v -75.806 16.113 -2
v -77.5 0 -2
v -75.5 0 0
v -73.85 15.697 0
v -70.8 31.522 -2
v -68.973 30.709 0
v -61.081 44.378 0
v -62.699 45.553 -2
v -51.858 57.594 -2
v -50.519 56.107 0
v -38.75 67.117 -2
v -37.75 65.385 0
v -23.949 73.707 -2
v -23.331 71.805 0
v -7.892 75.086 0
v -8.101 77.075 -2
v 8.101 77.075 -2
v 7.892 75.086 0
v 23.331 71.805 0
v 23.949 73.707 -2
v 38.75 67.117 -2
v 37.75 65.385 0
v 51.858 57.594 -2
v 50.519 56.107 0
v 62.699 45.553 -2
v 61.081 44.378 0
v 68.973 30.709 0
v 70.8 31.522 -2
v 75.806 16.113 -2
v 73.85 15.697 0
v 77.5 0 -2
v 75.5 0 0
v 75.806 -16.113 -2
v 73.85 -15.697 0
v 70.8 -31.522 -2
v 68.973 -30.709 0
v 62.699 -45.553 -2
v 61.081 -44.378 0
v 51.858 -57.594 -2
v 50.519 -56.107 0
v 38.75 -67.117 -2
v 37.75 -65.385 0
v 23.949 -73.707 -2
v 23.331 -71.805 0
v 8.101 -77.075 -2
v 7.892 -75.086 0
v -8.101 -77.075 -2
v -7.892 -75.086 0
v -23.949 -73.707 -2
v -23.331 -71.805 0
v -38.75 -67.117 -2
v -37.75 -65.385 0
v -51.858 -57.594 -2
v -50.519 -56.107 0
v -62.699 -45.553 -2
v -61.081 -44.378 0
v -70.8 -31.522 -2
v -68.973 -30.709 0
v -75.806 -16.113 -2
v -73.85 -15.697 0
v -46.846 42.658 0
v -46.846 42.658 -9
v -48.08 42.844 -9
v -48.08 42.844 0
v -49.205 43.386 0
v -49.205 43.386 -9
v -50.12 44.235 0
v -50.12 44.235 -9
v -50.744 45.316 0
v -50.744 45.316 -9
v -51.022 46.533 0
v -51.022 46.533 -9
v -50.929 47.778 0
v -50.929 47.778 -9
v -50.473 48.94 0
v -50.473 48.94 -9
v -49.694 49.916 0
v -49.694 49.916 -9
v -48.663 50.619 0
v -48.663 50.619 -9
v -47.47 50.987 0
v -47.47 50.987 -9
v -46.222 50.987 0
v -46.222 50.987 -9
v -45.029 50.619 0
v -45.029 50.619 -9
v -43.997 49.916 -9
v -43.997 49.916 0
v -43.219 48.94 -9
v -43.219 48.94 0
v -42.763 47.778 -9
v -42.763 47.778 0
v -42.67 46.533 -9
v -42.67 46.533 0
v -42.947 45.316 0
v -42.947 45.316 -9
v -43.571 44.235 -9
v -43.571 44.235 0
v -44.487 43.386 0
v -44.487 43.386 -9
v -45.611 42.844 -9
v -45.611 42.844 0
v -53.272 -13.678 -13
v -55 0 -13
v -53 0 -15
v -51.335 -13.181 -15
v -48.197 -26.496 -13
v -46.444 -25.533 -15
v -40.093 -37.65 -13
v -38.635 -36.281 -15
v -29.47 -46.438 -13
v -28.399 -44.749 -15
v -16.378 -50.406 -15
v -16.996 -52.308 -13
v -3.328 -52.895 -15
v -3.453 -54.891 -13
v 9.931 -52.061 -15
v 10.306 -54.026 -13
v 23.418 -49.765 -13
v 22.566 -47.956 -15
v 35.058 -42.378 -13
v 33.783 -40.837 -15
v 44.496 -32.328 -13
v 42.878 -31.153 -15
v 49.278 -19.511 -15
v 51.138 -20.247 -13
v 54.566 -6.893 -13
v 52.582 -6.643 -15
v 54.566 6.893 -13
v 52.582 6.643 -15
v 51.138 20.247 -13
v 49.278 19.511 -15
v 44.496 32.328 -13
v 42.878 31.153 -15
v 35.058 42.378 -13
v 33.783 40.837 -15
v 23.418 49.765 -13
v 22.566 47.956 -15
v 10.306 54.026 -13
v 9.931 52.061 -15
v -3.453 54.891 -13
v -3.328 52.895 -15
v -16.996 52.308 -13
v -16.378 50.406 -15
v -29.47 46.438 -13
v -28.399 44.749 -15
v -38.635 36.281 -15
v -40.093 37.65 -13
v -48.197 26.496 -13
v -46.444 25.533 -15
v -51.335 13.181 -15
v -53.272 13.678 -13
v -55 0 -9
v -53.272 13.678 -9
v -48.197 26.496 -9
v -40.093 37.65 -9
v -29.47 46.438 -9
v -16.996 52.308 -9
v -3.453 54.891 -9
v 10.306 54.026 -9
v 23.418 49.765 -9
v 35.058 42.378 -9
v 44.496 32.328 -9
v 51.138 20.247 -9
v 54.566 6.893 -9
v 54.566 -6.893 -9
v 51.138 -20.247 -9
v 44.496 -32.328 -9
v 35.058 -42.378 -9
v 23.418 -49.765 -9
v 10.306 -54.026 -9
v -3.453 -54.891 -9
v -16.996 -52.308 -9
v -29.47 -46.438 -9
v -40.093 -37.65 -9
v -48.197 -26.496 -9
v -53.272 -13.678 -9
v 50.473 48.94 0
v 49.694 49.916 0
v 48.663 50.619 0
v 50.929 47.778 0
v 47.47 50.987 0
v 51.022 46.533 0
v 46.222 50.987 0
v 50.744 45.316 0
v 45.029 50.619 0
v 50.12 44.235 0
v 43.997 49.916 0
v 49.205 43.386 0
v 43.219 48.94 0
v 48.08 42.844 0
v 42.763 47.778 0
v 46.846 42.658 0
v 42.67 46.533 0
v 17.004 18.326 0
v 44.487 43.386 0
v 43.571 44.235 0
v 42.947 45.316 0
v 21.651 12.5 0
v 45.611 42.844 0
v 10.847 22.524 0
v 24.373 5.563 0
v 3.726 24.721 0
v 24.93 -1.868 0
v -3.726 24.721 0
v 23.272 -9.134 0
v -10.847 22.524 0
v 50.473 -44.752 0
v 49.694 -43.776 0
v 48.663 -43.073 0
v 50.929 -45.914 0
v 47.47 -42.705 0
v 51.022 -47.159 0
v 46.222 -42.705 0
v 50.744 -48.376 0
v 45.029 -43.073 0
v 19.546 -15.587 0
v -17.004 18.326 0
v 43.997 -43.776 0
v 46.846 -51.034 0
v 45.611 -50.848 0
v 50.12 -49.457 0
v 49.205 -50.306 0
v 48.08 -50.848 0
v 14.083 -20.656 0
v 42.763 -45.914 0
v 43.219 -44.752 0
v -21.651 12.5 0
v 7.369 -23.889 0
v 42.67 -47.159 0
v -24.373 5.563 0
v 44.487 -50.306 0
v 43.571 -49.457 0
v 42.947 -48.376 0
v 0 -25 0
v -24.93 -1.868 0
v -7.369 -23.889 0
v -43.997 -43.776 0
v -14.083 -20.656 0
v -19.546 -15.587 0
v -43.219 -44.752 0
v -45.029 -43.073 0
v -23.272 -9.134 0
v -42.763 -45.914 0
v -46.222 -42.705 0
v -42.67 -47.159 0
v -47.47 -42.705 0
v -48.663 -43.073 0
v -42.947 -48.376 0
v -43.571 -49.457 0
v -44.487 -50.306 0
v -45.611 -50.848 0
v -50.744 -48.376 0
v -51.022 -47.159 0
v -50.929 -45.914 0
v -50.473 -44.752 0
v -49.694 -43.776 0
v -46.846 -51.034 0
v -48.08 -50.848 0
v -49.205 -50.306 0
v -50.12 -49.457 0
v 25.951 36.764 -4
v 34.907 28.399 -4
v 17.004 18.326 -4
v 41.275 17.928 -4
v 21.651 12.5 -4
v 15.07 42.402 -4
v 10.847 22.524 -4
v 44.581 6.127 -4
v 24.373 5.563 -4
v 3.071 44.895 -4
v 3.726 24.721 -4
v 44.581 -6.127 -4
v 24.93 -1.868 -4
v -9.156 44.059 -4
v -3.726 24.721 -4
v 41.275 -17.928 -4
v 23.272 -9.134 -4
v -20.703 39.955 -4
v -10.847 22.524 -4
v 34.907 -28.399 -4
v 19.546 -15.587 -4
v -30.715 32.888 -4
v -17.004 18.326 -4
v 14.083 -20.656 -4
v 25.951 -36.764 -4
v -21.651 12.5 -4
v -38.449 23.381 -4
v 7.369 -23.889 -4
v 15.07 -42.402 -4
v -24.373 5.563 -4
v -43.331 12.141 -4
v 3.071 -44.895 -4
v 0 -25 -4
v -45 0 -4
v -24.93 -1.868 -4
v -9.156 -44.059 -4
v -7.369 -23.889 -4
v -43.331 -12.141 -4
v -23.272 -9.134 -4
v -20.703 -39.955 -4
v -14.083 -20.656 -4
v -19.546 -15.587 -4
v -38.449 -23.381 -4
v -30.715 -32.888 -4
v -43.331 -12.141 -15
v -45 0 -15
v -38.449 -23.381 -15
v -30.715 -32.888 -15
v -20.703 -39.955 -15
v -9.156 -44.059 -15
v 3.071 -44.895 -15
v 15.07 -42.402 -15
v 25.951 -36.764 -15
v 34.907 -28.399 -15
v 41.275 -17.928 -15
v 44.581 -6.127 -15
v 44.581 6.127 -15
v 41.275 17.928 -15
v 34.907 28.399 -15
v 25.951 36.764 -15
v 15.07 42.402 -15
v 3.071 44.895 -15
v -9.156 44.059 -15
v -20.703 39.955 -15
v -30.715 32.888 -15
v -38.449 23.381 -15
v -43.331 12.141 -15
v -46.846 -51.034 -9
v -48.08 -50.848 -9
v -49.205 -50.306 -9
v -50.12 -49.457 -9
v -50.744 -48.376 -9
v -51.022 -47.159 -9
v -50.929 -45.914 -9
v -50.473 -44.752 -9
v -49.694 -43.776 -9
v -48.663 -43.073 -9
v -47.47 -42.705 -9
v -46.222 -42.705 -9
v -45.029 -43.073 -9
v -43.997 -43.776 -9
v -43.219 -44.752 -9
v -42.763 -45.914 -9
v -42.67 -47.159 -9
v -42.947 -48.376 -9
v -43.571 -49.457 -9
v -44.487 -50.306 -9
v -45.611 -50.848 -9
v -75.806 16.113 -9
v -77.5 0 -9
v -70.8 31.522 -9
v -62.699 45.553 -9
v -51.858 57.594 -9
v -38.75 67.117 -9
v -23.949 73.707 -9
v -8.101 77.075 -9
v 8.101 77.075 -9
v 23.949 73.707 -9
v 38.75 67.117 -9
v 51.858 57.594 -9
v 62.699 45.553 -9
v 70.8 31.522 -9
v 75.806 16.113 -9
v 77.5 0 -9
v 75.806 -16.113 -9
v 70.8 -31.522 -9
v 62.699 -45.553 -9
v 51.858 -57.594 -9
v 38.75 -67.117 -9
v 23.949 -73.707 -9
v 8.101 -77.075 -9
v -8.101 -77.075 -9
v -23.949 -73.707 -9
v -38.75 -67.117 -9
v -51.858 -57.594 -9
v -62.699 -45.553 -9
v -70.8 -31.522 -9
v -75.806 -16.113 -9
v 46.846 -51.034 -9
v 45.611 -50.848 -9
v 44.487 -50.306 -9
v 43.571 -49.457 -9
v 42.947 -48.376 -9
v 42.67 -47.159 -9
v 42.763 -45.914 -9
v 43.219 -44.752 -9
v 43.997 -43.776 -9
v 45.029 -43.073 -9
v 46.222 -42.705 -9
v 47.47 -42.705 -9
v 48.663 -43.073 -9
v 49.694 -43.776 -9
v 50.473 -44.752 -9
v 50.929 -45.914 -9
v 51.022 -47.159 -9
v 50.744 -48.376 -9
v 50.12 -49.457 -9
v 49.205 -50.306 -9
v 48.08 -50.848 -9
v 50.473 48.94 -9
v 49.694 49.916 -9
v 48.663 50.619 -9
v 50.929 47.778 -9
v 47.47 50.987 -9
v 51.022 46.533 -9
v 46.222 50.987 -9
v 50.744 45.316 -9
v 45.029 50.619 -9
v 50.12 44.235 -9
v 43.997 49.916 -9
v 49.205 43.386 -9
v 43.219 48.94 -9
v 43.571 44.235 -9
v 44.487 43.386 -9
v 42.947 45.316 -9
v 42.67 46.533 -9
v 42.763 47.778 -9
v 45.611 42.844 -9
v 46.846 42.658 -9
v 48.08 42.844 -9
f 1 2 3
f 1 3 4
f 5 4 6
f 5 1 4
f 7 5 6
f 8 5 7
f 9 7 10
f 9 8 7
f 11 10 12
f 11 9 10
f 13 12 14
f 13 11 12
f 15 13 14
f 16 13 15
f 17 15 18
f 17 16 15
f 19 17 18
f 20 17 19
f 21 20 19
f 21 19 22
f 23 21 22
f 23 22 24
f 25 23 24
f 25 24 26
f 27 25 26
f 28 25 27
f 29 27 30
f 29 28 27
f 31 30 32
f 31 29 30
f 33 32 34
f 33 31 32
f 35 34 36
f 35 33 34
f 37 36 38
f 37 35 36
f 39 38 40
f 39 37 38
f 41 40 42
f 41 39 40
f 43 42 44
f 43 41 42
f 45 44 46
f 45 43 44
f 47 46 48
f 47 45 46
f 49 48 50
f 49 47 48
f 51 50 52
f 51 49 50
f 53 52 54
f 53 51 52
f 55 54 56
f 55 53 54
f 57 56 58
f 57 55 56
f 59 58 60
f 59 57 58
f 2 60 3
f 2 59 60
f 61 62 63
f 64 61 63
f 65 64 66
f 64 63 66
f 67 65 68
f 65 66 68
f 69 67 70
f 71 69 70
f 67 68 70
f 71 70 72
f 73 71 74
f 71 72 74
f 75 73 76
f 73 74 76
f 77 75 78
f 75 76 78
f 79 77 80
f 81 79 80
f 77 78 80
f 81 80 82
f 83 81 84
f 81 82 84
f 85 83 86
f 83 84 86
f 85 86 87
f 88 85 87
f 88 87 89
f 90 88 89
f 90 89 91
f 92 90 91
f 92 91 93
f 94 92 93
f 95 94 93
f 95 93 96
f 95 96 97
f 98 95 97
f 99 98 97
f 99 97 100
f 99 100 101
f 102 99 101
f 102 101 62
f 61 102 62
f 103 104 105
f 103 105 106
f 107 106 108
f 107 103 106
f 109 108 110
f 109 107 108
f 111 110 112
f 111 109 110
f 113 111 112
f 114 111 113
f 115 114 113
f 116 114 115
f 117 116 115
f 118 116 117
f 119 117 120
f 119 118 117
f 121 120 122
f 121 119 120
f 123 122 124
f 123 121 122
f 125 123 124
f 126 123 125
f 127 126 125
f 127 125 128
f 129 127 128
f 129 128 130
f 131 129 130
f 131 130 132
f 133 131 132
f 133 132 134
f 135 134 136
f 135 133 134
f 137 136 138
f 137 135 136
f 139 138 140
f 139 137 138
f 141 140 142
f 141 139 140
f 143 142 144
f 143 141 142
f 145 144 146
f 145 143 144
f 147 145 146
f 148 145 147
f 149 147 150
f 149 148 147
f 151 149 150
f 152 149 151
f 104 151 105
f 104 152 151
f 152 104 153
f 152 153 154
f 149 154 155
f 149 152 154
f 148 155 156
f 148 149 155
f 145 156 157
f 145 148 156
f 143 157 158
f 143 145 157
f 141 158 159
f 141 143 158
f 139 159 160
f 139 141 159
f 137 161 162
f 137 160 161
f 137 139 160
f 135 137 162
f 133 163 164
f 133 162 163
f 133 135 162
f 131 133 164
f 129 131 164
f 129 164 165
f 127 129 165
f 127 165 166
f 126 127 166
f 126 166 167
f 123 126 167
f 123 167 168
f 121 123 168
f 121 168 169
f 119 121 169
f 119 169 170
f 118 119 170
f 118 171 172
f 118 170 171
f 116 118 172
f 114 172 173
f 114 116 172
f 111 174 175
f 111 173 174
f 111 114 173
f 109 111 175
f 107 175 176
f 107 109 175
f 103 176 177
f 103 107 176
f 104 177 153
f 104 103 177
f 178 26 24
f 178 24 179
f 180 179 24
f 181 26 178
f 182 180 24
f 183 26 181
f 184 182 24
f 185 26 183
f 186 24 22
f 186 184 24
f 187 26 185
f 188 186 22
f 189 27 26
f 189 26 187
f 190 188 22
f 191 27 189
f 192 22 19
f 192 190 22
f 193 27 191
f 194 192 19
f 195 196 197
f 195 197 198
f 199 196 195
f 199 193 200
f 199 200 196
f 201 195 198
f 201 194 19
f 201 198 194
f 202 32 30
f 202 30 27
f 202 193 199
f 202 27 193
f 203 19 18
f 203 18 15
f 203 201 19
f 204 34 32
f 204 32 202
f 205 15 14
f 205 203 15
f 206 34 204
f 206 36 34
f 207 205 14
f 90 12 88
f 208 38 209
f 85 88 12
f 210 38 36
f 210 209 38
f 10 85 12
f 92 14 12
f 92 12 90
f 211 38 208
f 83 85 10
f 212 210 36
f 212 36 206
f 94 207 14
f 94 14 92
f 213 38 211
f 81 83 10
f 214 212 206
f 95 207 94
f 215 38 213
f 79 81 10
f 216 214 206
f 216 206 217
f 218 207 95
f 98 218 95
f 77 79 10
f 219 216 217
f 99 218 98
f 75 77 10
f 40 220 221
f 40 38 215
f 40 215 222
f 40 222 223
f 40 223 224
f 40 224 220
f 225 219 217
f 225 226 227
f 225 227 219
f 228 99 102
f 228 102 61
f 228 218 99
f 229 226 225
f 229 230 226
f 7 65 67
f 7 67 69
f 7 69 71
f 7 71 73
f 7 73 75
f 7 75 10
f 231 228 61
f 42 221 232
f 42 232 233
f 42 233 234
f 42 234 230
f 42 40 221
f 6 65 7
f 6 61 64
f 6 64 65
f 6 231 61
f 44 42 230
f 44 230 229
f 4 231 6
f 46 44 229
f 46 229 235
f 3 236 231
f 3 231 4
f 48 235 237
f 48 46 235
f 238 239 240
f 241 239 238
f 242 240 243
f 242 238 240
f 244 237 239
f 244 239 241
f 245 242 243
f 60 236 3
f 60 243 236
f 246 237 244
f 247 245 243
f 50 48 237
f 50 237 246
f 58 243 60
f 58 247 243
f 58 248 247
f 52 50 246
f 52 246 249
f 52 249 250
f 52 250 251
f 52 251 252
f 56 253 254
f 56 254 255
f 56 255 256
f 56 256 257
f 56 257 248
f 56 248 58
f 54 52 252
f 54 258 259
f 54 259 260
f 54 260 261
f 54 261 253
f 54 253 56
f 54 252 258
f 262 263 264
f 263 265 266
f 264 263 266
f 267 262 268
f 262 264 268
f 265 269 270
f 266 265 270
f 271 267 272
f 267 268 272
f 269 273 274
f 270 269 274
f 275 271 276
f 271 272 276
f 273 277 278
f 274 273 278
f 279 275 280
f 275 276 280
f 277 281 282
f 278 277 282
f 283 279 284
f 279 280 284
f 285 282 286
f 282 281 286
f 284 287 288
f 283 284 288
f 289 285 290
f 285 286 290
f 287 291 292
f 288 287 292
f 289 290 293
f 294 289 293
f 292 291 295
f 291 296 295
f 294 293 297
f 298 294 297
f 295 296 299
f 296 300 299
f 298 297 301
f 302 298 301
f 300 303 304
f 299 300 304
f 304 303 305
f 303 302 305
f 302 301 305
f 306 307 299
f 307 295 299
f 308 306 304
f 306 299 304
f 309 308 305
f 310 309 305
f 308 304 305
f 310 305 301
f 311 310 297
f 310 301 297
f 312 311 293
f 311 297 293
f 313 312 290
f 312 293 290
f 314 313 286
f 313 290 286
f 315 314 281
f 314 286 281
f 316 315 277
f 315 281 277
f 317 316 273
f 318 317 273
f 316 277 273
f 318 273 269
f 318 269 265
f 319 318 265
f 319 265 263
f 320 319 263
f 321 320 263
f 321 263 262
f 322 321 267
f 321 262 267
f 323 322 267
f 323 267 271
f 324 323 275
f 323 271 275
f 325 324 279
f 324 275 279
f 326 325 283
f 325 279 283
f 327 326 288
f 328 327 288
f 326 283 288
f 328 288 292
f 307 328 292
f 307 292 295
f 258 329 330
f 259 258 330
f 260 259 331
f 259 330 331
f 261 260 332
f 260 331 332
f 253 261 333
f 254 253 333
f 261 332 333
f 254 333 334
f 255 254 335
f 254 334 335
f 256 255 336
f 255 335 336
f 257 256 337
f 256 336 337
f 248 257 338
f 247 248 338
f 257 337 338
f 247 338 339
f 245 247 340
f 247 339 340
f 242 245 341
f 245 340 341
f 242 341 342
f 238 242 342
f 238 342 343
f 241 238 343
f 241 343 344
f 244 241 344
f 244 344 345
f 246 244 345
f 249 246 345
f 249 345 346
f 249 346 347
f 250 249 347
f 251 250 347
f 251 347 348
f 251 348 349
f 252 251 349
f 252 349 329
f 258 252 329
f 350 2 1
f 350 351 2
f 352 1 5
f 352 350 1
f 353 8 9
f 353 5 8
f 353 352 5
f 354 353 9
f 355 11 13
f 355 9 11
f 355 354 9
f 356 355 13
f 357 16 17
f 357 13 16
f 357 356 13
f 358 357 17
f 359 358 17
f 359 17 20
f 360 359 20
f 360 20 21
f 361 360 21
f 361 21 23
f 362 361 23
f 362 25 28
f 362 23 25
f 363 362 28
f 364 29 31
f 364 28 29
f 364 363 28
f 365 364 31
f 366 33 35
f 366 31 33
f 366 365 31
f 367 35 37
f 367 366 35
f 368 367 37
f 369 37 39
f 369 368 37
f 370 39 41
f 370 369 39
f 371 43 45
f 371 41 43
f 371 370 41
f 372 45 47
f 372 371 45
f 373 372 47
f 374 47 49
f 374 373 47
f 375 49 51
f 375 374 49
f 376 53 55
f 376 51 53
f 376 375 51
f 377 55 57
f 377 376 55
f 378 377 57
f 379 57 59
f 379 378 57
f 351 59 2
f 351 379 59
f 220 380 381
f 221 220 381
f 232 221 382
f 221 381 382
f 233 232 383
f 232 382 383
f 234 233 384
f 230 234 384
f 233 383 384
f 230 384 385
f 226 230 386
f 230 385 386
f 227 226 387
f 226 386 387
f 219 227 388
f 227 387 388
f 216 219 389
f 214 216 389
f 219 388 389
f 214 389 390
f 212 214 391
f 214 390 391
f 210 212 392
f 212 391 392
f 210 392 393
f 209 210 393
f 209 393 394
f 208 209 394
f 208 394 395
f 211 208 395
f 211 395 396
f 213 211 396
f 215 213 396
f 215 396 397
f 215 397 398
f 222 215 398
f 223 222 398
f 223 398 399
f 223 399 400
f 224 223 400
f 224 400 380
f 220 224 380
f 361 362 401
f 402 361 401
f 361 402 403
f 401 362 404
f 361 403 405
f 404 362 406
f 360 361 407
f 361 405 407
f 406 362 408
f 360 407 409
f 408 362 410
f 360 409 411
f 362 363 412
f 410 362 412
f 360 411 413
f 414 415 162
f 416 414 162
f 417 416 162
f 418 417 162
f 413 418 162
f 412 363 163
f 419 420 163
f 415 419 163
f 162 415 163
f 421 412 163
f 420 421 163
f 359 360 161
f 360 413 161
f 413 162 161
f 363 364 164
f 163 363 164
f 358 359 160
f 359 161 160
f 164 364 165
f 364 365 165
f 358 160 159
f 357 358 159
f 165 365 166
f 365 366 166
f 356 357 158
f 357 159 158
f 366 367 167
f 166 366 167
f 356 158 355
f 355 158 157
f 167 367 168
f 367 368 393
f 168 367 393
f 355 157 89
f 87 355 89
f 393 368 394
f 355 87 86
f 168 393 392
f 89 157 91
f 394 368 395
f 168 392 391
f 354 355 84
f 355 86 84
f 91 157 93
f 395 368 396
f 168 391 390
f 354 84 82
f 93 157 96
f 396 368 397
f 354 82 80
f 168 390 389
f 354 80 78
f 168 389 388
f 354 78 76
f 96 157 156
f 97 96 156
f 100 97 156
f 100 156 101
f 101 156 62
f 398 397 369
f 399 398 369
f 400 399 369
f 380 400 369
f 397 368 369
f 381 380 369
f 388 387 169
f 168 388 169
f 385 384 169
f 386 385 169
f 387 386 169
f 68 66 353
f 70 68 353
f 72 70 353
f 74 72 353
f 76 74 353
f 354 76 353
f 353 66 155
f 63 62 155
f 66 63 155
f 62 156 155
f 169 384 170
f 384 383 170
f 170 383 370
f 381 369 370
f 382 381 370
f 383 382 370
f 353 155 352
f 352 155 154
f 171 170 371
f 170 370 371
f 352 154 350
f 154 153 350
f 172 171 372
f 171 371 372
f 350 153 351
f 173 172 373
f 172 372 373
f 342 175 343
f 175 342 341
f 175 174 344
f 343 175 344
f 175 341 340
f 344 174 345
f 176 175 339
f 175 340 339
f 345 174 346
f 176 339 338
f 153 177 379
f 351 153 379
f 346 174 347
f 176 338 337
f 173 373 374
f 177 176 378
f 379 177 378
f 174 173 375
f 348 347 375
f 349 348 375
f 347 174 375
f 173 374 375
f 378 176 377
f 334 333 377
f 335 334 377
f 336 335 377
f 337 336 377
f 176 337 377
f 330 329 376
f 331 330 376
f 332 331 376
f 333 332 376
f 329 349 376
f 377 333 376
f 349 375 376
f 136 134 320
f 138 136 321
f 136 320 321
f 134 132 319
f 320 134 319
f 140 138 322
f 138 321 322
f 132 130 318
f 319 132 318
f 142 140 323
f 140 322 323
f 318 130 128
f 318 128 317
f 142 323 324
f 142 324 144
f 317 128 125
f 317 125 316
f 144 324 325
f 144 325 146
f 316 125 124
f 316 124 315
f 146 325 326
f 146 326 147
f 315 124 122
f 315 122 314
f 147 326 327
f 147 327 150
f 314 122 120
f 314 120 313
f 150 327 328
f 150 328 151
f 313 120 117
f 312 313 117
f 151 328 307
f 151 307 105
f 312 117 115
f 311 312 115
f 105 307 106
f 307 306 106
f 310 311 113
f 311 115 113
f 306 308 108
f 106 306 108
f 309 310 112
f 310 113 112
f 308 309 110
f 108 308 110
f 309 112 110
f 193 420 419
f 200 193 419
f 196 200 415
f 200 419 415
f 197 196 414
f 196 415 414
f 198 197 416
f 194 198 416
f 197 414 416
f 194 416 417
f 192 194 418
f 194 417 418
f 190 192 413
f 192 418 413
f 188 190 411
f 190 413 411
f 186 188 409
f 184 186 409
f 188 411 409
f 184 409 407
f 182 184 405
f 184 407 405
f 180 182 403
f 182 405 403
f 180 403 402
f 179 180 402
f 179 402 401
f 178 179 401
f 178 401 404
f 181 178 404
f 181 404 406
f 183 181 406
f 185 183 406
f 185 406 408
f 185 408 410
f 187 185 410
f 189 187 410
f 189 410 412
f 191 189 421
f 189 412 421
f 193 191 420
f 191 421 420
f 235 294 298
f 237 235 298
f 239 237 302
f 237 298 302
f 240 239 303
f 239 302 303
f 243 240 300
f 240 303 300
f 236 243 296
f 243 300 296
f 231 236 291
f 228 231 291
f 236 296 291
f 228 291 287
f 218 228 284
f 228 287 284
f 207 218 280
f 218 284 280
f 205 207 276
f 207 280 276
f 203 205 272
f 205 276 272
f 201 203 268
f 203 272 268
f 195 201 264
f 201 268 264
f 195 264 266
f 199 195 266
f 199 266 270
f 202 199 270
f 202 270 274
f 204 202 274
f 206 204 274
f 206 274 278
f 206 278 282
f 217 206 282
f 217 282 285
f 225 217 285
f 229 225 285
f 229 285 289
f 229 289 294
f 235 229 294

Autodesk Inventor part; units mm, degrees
ref_plane "YZ Plane" through (0, 0, 0) normal (1, 0, 0) x (0, 1, 0)
ref_plane "XZ Plane" through (0, 0, 0) normal (0, 1, 0) x (-1, 0, 0)
ref_plane "XY Plane" through (0, 0, 0) normal (0, 0, 1) x (1, 0, 0)
sketch "Эскиз1" plane through (0, 0, 0) normal (0, 1, 0) x (-1, 0, 0)
  line L0 (0, 0) -> (77.5, 0)
  line L1 (77.5, 0) -> (77.5, -9)
  line L2 (77.5, -9) -> (55, -9)
  line L3 (55, -9) -> (55, -15)
  line L4 (0, -4) -> (0, 0)
  line L5 (55, -15) -> (45, -15)
  line L6 (45, -15) -> (45, -4)
  line L7 (45, -4) -> (0, -4)
  dimension "d0" = 155
  dimension "d1" = 110
  dimension "d3" = 9
  dimension "d5" = 15
  dimension "d6" = 90
  dimension "d7" = 4
revolve "Вращение1" add sketch "Эскиз1" angle 360 about axis through (0, 0, -4) along (0, 0, 1)
sketch "Эскиз3" plane through (0, 0, 0) normal (0, 0, 1) x (1, 0, 0)
  circle A0 centre (0, 0) radius 66.25 construction
  line L0 (0, 0) -> (-70.023, -70.023) construction
  line L1 (0, 0) -> (99.0274, 0) construction
  point P0 (0, 0)
  point P1 (-46.8458, -46.8458)
  point P2 (46.8458, -46.8458)
  point P3 (46.8458, 46.8458)
  point P4 (-46.8458, 46.8458)
  dimension "d15" = 132.5
  dimension "d16" = 135
  dimension "d19" = 360
hole "Отверстие1" at (-46.8458, -46.8458, 0) at (46.8458, -46.8458, 0) at (46.8458, 46.8458, 0) at (-46.8458, 46.8458, 0) direction (0, 0, -1) diameter 8.376 end through all thread size "M10x1.5" class "6H" standard "ISO Metric profile"
chamfer "Фаска1" distance 2 angle 45 2 edges at (55, 0, -15) (77.5, 0, 0)
sketch "Эскиз4" plane through (0, 0, 0) normal (0, 0, 1) x (1, 0, 0)
  circle A0 centre (0, 0) radius 77.5 projected
  point P0 (0, 0)
hole "Отверстие2" at (0, 0, 0) direction (0, 0, -1) diameter 50 end through all
properties part number "МПСТ Крышка подшипника с отверстием 110" material "Сталь, углеродистая"
